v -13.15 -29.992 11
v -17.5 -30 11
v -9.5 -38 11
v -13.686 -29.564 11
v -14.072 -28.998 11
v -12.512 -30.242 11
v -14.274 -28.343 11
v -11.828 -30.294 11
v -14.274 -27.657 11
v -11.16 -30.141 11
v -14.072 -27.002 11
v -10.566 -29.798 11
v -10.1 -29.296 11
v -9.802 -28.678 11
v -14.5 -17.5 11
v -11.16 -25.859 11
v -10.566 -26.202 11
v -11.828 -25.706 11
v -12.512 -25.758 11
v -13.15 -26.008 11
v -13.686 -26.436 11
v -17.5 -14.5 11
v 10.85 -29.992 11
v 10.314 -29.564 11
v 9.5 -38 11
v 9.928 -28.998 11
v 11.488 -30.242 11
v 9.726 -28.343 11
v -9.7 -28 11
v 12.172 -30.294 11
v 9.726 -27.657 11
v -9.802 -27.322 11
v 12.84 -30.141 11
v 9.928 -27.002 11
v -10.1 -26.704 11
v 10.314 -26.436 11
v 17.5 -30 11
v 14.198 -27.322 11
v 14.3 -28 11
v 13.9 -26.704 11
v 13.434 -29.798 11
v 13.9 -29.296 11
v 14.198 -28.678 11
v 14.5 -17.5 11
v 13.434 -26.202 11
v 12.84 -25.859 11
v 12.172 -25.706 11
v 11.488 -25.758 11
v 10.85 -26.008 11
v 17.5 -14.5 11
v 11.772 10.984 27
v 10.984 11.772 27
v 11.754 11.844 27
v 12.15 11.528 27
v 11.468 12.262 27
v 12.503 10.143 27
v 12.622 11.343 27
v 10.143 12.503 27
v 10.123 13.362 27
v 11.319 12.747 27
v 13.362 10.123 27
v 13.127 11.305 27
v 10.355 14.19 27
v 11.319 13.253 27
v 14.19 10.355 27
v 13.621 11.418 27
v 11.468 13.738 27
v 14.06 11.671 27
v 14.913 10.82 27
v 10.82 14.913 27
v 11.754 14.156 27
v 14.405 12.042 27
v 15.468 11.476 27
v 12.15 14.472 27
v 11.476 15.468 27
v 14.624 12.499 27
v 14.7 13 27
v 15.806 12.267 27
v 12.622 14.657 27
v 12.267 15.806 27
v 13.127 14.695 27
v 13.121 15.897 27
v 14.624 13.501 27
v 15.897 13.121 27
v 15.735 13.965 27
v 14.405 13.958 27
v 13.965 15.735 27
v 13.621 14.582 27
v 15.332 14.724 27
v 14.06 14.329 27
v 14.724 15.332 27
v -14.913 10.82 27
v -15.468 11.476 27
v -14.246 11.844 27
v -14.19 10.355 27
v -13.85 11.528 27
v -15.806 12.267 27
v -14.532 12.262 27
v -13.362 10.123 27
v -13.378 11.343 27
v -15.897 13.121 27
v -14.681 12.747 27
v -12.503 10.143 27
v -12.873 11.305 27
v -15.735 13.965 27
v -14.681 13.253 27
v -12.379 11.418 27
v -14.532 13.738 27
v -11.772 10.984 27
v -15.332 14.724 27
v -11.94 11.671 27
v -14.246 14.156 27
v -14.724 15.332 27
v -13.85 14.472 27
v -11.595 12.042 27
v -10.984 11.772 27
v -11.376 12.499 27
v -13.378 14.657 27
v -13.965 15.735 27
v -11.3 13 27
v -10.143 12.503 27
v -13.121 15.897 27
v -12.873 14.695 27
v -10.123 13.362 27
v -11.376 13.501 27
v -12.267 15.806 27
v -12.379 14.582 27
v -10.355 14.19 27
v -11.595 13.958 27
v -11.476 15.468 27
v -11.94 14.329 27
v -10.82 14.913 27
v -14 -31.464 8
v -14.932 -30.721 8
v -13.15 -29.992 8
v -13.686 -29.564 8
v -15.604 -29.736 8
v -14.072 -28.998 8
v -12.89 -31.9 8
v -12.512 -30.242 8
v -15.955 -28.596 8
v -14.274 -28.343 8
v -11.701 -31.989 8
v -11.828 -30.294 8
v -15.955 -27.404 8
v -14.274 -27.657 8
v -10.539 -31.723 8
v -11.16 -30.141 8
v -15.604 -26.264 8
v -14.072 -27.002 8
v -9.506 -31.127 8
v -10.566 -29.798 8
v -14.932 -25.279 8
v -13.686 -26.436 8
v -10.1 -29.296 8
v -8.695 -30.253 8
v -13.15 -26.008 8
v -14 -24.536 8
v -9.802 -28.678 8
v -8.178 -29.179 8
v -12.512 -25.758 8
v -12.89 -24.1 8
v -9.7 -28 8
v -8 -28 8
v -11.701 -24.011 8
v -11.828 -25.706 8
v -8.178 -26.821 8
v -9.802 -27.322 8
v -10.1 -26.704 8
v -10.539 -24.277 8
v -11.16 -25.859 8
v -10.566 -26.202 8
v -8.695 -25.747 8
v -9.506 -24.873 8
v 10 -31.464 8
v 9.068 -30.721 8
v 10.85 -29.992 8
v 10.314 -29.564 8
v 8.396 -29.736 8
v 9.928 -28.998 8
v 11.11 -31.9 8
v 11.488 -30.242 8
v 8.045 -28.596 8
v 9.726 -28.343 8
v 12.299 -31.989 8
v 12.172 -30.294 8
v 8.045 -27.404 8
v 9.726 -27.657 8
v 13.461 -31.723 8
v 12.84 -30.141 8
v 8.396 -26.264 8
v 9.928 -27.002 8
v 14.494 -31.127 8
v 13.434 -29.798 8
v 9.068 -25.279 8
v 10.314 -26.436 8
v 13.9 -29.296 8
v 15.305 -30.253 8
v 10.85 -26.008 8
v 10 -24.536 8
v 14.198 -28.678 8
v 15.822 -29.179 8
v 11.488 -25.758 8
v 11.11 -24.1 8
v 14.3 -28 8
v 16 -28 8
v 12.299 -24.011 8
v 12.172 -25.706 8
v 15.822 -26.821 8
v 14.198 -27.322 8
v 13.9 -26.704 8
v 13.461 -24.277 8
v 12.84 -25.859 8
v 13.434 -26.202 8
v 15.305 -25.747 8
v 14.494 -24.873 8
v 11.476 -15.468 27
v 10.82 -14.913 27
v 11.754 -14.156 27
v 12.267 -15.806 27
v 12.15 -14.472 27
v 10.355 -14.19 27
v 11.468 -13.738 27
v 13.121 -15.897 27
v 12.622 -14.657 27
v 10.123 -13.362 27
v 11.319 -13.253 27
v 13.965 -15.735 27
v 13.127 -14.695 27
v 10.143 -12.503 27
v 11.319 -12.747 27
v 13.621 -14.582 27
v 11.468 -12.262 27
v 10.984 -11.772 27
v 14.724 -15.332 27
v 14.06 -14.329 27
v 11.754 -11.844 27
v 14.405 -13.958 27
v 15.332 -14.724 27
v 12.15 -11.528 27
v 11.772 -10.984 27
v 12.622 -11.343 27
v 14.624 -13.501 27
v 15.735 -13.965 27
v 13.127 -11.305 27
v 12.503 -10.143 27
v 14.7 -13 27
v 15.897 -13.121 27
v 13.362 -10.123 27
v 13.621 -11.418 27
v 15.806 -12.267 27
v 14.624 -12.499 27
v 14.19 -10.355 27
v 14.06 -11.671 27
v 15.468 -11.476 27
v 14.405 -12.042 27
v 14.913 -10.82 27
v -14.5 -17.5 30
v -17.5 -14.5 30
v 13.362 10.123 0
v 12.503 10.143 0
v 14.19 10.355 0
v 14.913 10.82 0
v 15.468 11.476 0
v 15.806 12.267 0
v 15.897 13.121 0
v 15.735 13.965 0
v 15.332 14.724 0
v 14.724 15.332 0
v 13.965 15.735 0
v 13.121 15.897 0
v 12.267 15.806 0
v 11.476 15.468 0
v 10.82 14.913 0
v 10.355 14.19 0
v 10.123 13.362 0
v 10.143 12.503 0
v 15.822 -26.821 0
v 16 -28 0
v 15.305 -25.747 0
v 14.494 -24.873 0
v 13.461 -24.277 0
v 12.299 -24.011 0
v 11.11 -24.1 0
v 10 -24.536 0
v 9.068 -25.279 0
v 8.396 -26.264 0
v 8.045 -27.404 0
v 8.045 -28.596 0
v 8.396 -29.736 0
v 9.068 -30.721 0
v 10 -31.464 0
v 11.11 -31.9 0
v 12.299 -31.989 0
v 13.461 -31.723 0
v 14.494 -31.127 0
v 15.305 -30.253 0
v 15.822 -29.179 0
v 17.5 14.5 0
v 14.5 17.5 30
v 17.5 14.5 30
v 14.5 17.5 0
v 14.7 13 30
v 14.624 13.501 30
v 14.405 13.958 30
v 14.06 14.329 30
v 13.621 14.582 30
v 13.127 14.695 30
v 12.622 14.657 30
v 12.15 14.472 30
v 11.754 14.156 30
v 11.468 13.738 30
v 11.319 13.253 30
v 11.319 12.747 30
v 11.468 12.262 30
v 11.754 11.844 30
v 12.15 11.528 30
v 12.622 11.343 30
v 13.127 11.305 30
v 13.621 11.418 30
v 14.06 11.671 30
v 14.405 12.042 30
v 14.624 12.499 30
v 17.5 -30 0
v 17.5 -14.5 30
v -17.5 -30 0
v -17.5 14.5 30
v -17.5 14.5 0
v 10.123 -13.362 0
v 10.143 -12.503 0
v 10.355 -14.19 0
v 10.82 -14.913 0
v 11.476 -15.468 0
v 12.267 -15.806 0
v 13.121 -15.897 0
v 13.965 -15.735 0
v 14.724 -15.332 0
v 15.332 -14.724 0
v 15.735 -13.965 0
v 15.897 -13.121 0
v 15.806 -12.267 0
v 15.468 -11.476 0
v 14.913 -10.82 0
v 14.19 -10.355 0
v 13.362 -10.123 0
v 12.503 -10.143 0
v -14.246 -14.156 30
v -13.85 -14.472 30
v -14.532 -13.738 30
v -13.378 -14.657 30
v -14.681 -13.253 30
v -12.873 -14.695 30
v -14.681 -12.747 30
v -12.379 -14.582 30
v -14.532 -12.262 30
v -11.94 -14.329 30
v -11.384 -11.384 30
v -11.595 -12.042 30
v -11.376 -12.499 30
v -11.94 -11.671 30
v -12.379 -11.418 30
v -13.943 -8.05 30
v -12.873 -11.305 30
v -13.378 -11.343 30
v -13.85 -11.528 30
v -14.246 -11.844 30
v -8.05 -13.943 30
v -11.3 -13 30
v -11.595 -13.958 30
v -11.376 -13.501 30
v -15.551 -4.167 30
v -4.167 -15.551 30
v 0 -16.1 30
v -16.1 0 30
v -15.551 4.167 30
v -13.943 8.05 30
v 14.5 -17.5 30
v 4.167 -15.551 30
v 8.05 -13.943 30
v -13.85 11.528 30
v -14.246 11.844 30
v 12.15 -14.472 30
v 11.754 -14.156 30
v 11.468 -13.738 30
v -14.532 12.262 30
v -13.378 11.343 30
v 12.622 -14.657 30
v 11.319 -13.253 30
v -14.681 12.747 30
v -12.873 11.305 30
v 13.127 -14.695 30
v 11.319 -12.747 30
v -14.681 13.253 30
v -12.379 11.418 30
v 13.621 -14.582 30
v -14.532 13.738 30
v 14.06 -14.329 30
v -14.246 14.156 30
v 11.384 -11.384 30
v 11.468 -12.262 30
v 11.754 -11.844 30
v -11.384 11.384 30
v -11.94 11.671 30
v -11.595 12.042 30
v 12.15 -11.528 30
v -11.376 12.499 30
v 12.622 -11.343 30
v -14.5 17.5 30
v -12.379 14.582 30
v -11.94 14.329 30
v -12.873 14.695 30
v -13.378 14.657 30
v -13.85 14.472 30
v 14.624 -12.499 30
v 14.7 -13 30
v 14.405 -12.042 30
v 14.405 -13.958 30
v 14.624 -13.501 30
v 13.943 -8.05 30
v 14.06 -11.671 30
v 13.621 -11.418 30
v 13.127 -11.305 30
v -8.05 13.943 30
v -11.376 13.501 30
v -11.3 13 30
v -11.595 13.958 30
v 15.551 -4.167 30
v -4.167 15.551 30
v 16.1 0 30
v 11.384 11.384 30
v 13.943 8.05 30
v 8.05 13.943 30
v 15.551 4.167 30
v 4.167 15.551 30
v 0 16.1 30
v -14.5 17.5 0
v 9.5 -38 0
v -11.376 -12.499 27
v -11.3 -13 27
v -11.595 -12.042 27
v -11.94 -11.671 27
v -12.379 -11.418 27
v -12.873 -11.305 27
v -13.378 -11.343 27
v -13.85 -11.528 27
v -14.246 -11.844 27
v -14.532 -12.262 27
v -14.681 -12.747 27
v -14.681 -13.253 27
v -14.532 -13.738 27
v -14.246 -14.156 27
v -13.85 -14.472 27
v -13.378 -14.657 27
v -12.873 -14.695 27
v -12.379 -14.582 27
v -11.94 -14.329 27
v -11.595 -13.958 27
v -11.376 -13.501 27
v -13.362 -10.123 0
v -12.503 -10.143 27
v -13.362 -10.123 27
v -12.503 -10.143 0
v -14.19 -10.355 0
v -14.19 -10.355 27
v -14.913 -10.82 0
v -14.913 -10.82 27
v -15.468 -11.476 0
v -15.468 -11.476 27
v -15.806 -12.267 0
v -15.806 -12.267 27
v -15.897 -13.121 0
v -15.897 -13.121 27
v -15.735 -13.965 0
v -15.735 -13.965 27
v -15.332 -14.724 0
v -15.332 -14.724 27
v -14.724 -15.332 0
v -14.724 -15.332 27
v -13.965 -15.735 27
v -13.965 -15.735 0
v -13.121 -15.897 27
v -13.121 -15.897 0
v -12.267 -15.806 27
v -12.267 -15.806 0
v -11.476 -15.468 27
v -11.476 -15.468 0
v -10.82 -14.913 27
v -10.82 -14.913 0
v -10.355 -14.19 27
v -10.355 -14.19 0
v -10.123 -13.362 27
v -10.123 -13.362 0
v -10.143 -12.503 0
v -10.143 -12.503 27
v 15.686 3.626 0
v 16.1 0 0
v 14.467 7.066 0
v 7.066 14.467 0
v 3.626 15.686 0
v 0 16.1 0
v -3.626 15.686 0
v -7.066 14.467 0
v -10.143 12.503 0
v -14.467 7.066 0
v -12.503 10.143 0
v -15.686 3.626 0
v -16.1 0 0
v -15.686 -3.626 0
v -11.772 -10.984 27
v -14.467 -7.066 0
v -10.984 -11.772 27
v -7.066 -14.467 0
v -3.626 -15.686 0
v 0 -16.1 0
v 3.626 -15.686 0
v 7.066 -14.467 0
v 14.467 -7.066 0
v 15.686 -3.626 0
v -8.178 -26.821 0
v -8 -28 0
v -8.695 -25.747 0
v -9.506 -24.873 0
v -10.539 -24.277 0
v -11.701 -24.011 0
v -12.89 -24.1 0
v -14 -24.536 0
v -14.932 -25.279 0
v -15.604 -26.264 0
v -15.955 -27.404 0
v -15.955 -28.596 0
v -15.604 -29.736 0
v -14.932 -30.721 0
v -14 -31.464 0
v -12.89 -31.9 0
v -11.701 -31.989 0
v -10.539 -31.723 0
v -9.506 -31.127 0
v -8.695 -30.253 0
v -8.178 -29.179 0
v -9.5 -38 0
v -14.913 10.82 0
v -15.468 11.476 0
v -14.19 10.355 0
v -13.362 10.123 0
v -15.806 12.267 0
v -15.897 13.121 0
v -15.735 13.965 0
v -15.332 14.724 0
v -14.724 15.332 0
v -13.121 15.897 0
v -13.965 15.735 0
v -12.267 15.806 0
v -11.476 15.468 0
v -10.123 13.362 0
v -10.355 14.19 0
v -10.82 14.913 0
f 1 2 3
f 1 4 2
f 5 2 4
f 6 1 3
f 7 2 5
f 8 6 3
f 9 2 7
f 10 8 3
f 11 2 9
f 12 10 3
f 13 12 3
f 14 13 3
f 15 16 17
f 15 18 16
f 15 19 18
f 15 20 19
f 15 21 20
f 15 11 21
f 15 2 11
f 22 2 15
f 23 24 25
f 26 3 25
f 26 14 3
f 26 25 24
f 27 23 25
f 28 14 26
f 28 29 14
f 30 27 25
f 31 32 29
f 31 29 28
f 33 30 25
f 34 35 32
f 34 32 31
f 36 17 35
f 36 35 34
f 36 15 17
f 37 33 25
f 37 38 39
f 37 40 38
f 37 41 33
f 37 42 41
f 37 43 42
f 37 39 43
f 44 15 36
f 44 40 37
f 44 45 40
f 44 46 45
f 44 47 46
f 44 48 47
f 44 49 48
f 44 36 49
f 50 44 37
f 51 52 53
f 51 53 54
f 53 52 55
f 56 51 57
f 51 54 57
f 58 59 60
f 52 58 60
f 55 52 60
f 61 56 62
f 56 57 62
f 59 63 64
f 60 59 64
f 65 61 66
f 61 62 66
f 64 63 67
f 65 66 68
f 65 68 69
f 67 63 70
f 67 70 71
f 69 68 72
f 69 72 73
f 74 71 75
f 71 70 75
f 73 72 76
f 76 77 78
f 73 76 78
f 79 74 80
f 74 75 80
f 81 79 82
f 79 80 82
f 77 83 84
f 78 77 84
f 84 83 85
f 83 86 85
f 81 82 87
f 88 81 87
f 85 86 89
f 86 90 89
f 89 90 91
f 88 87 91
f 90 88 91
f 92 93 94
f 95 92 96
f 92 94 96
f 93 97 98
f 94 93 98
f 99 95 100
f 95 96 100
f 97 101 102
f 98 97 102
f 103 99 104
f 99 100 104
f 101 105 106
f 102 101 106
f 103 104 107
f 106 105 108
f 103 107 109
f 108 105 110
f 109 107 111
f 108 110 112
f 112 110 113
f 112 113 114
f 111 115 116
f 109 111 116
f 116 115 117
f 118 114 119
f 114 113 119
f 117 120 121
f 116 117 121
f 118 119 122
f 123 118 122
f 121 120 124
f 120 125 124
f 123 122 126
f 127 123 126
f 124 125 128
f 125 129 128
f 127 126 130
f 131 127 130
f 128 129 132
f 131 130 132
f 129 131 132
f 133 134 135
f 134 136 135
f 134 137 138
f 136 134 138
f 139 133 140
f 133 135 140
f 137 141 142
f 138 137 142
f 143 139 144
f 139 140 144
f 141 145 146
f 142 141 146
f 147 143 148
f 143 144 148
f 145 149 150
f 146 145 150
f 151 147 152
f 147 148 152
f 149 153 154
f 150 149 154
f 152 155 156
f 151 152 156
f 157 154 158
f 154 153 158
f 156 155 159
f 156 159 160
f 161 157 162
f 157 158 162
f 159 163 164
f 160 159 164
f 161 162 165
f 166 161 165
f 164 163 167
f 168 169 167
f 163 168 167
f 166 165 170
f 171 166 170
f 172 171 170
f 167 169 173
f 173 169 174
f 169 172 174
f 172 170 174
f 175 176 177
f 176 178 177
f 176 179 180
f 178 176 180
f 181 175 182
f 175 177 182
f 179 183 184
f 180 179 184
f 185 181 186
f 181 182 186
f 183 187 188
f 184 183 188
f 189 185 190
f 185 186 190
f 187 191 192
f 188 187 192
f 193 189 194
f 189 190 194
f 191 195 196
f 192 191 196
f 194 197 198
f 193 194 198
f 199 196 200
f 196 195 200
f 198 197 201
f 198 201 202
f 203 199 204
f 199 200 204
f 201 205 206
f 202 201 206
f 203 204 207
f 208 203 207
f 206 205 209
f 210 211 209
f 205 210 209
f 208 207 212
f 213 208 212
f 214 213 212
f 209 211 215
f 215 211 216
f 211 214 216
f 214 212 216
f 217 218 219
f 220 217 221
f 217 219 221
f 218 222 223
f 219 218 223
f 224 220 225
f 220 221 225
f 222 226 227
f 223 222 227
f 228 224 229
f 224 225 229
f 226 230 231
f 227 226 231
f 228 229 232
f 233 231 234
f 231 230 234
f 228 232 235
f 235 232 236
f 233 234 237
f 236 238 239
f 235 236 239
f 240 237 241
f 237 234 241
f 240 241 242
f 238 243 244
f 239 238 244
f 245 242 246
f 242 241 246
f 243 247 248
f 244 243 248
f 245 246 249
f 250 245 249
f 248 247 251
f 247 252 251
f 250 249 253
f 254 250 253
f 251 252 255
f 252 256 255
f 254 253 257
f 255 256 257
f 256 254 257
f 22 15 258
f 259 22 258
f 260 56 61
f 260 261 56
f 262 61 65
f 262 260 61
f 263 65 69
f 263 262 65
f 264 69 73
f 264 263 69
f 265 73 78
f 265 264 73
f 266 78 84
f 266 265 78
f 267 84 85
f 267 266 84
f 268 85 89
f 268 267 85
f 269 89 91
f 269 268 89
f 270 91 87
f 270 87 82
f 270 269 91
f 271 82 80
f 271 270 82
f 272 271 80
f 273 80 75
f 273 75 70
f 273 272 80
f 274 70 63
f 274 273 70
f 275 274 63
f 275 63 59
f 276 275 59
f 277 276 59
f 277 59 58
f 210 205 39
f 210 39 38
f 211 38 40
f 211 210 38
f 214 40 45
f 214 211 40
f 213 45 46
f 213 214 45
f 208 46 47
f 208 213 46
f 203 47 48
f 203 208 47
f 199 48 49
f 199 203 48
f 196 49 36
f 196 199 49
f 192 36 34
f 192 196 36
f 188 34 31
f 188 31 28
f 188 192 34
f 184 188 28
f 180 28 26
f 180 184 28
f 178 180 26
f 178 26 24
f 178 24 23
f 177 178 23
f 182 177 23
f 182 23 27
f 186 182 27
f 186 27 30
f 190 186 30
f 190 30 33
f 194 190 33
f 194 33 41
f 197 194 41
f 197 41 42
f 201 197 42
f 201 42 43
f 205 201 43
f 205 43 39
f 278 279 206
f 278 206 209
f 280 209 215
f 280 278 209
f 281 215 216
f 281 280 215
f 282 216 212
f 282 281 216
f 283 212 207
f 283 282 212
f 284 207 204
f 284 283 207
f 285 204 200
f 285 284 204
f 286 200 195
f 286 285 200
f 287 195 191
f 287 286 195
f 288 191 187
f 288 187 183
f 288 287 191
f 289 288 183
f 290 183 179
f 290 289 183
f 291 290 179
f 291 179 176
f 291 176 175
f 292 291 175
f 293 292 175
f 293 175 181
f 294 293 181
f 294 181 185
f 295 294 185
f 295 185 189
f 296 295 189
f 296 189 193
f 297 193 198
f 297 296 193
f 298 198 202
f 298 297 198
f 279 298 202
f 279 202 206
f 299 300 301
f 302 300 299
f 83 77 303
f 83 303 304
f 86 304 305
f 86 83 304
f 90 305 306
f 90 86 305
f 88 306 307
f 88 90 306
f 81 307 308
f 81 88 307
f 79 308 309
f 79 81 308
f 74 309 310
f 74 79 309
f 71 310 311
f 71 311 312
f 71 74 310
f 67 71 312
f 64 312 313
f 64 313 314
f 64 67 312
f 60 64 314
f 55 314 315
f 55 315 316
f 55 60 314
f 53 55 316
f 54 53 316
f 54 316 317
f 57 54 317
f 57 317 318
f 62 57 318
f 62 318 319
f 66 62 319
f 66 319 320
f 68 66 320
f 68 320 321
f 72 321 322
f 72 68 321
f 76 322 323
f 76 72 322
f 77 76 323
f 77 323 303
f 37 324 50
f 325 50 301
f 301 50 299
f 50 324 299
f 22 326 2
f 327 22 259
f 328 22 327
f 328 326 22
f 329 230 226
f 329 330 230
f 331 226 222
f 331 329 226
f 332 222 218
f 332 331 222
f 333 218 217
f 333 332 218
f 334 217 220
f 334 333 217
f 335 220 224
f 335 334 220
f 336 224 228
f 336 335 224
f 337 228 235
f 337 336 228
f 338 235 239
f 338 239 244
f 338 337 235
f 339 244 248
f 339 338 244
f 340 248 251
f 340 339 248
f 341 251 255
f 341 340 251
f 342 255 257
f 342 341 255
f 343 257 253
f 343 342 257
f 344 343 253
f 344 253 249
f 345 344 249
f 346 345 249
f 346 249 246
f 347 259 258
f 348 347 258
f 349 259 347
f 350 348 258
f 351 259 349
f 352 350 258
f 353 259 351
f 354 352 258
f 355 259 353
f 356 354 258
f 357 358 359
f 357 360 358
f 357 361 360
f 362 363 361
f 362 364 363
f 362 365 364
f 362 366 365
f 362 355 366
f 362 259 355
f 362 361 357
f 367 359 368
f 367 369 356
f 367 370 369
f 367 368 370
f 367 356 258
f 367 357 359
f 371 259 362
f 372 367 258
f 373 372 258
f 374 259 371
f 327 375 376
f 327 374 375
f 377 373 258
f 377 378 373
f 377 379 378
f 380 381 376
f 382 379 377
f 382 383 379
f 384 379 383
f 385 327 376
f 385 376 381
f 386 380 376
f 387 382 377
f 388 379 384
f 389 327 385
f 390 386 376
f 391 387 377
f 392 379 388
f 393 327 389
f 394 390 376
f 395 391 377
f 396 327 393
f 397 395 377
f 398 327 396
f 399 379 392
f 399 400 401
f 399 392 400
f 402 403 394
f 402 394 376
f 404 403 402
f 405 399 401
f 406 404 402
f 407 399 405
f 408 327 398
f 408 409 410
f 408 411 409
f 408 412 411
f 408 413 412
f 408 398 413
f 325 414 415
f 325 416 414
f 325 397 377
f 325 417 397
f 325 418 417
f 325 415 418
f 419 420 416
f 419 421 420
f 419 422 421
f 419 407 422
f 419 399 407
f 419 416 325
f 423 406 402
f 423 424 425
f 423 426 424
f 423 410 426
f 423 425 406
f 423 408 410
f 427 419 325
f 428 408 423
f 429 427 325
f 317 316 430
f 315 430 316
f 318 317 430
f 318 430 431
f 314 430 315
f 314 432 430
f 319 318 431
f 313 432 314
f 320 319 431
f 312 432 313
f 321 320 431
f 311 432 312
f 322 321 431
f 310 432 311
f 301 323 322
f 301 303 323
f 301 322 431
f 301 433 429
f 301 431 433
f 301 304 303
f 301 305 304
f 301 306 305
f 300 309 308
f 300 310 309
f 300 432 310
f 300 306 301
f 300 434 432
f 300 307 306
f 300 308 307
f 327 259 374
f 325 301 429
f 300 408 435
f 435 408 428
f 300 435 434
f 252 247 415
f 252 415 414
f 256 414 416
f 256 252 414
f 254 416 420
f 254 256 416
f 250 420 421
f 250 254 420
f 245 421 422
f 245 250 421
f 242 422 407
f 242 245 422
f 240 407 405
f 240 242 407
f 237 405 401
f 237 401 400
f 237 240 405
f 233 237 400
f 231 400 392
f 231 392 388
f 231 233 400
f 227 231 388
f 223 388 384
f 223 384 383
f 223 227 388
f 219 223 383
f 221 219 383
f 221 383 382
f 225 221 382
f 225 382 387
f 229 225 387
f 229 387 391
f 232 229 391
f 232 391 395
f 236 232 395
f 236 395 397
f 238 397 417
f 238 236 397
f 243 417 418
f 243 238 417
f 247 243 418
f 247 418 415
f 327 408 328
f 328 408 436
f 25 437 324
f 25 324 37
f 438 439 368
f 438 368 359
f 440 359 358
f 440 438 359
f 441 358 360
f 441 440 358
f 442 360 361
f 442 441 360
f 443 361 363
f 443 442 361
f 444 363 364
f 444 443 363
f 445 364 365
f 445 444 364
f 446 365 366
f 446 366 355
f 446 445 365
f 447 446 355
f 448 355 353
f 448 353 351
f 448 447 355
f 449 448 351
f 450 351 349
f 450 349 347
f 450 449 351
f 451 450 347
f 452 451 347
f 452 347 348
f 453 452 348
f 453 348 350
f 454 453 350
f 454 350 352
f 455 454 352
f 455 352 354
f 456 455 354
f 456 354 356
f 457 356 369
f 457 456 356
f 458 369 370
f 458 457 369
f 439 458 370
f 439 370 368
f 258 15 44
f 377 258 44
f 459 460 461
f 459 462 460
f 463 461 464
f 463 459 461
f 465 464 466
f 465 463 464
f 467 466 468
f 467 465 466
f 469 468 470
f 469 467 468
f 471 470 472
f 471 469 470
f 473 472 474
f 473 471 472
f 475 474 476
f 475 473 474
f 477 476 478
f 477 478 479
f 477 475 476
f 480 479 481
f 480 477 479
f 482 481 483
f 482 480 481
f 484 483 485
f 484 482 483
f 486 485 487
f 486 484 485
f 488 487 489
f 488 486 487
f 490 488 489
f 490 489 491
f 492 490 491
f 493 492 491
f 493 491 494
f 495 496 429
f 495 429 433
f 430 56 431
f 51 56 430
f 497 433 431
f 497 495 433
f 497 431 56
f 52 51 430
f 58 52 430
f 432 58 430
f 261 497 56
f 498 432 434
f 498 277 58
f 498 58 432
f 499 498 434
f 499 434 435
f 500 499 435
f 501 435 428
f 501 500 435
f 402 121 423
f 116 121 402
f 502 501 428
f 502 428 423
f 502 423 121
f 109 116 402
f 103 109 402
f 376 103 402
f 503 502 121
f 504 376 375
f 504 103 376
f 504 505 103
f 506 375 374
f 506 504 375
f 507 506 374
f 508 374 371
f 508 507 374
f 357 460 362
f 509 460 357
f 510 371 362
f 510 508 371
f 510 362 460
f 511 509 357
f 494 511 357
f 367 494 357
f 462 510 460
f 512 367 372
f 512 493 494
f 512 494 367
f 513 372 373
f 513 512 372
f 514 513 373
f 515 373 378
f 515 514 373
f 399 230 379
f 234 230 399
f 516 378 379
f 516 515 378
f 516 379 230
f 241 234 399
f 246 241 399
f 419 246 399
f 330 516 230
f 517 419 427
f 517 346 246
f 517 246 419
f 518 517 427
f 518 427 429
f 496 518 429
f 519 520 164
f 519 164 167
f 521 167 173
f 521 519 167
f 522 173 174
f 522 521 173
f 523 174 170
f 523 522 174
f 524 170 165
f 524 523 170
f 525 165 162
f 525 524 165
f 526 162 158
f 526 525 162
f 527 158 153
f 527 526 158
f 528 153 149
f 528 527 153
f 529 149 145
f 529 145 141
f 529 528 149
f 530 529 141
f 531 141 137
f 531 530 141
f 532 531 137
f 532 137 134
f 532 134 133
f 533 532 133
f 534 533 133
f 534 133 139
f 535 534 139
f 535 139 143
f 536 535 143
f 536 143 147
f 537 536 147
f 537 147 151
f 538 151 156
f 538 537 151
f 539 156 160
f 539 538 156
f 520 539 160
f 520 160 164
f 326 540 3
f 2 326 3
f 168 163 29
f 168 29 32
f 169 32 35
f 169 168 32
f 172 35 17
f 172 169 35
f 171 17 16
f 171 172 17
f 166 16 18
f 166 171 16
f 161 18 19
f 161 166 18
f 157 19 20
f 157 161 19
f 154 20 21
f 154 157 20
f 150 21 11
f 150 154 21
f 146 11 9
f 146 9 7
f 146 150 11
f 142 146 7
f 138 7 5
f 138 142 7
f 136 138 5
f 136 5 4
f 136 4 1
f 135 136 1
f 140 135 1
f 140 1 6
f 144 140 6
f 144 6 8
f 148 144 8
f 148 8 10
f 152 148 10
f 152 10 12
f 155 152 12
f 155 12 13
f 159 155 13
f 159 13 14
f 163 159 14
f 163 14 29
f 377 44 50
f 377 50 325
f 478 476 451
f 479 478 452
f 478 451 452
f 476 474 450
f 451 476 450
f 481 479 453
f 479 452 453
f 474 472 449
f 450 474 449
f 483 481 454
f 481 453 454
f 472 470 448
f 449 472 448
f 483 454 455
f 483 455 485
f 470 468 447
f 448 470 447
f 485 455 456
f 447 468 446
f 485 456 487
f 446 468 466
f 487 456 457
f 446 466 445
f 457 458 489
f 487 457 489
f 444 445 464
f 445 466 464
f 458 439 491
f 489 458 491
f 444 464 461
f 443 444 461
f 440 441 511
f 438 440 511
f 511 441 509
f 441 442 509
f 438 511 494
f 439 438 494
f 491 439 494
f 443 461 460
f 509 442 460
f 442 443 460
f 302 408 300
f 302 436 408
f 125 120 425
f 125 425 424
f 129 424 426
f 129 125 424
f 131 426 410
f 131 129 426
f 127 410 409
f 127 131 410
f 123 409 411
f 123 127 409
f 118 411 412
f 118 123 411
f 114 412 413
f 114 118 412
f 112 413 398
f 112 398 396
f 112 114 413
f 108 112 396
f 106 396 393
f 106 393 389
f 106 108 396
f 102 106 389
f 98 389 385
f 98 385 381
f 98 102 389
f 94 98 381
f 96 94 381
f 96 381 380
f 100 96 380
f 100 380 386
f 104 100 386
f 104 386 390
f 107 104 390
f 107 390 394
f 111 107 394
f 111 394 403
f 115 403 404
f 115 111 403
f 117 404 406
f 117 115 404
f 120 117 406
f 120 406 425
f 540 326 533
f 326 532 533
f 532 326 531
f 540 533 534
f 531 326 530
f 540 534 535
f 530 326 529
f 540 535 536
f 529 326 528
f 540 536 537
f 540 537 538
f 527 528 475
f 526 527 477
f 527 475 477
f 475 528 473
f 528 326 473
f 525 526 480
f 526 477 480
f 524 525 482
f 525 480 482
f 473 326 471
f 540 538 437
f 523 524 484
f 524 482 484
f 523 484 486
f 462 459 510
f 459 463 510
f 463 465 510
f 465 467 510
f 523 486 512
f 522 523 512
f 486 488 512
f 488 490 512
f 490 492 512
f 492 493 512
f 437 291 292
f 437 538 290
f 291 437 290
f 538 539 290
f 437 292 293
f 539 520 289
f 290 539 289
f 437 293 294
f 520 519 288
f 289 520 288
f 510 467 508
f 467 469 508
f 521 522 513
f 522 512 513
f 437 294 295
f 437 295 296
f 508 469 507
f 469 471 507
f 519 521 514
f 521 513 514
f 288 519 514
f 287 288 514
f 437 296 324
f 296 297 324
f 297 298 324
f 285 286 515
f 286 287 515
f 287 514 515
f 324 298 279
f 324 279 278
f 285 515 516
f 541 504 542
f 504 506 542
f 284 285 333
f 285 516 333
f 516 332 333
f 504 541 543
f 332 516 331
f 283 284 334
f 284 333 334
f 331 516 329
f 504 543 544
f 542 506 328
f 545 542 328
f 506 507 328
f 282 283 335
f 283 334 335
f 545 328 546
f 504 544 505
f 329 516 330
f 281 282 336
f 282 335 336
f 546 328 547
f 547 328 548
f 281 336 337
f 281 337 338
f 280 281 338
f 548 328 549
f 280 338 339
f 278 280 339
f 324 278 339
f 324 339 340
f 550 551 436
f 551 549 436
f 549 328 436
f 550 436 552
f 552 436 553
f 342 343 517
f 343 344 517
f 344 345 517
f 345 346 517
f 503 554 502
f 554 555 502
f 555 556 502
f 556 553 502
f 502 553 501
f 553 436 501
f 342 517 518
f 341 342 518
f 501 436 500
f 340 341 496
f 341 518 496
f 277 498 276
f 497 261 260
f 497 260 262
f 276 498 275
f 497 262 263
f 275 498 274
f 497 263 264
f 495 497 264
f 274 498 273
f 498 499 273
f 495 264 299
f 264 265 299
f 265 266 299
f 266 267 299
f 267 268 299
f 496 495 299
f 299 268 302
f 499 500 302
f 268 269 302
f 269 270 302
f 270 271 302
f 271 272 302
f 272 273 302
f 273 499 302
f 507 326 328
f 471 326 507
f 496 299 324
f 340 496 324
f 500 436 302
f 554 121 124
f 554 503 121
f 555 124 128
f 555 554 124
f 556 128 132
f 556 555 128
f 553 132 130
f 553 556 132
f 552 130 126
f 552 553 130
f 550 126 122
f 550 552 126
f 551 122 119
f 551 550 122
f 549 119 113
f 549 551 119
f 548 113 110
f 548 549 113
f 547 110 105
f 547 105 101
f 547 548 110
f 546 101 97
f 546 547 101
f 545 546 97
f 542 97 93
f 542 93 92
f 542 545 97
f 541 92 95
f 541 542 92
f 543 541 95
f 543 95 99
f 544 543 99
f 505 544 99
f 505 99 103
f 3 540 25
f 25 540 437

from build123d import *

# Parameters (mm, degrees)
SKIZZE1_W                       = 35
SKIZZE1_H                       = 55.5
SKIZZE1_R                       = 16.1
SKIZZE1_R_2                     = 1.7
SKIZZE1_R_3                     = 2.3
AUFSATZ_LINEAR_AUSTRAGEN1_DEPTH = 11
SKIZZE2_W                       = 35
SKIZZE2_H                       = 35
SKIZZE2_R                       = 16.1
SKIZZE2_R_2                     = 1.7
AUFSATZ_LINEAR_AUSTRAGEN2_DEPTH = 19
SKIZZE4_R                       = 4
SCHNITT_LINEAR_AUSTRAGEN1_DEPTH = 8
SKIZZE5_R                       = 2.9
SCHNITT_LINEAR_AUSTRAGEN2_DEPTH = 27
FASE1_SIZE                      = 3
FASE2_SIZE                      = 8


with BuildPart() as part:
    # Skizze1 → Aufsatz-Linear austragen1 (new body)
    with BuildSketch(Plane.XY):
        with Locations((0, -10.25)):
            Rectangle(SKIZZE1_W, SKIZZE1_H)
        Circle(SKIZZE1_R, mode=Mode.SUBTRACT)
        with Locations((-13, 13)):
            Circle(SKIZZE1_R_2, mode=Mode.SUBTRACT)
        with Locations((13, 13)):
            Circle(SKIZZE1_R_2, mode=Mode.SUBTRACT)
        with Locations((-13, -13)):
            Circle(SKIZZE1_R_2, mode=Mode.SUBTRACT)
        with Locations((13, -13)):
            Circle(SKIZZE1_R_2, mode=Mode.SUBTRACT)
        with Locations((-12, -28)):
            Circle(SKIZZE1_R_3, mode=Mode.SUBTRACT)
        with Locations((12, -28)):
            Circle(SKIZZE1_R_3, mode=Mode.SUBTRACT)
    extrude(amount=AUFSATZ_LINEAR_AUSTRAGEN1_DEPTH)

    # Skizze2 → Aufsatz-Linear austragen2 (add)
    with BuildSketch(Plane.XY.offset(11)):
        Rectangle(SKIZZE2_W, SKIZZE2_H)
        Circle(SKIZZE2_R, mode=Mode.SUBTRACT)
        with Locations((13, 13)):
            Circle(SKIZZE2_R_2, mode=Mode.SUBTRACT)
        with Locations((13, -13)):
            Circle(SKIZZE2_R_2, mode=Mode.SUBTRACT)
        with Locations((-13, -13)):
            Circle(SKIZZE2_R_2, mode=Mode.SUBTRACT)
        with Locations((-13, 13)):
            Circle(SKIZZE2_R_2, mode=Mode.SUBTRACT)
    extrude(amount=AUFSATZ_LINEAR_AUSTRAGEN2_DEPTH)

    # Skizze4 → Schnitt-Linear austragen1 (cut)
    with BuildSketch(Plane.XY):
        with Locations((-12, -28)):
            Circle(SKIZZE4_R)
        with Locations((12, -28)):
            Circle(SKIZZE4_R)
    extrude(amount=SCHNITT_LINEAR_AUSTRAGEN1_DEPTH, mode=Mode.SUBTRACT)

    # Skizze5 → Schnitt-Linear austragen2 (cut)
    with BuildSketch(Plane.XY):
        with Locations((-13, 13)):
            Circle(SKIZZE5_R)
        with Locations((13, 13)):
            Circle(SKIZZE5_R)
        with Locations((-13, -13)):
            Circle(SKIZZE5_R)
        with Locations((13, -13)):
            Circle(SKIZZE5_R)
    extrude(amount=SCHNITT_LINEAR_AUSTRAGEN2_DEPTH, mode=Mode.SUBTRACT)

    # Fase1
    fase1_edges = [part.edges().sort_by_distance(p)[0] for p in [
        (-17.5, -17.5, 20.5),
        (17.5, -17.5, 20.5),
        (-17.5, 17.5, 15),
        (17.5, 17.5, 15),
    ]]
    chamfer(fase1_edges, length=FASE1_SIZE)

    # Fase2
    fase2_edges = [part.edges().sort_by_distance(p)[0] for p in [
        (17.5, -38, 5.5),
        (-17.5, -38, 5.5),
    ]]
    chamfer(fase2_edges, length=FASE2_SIZE)


solid = part.part
